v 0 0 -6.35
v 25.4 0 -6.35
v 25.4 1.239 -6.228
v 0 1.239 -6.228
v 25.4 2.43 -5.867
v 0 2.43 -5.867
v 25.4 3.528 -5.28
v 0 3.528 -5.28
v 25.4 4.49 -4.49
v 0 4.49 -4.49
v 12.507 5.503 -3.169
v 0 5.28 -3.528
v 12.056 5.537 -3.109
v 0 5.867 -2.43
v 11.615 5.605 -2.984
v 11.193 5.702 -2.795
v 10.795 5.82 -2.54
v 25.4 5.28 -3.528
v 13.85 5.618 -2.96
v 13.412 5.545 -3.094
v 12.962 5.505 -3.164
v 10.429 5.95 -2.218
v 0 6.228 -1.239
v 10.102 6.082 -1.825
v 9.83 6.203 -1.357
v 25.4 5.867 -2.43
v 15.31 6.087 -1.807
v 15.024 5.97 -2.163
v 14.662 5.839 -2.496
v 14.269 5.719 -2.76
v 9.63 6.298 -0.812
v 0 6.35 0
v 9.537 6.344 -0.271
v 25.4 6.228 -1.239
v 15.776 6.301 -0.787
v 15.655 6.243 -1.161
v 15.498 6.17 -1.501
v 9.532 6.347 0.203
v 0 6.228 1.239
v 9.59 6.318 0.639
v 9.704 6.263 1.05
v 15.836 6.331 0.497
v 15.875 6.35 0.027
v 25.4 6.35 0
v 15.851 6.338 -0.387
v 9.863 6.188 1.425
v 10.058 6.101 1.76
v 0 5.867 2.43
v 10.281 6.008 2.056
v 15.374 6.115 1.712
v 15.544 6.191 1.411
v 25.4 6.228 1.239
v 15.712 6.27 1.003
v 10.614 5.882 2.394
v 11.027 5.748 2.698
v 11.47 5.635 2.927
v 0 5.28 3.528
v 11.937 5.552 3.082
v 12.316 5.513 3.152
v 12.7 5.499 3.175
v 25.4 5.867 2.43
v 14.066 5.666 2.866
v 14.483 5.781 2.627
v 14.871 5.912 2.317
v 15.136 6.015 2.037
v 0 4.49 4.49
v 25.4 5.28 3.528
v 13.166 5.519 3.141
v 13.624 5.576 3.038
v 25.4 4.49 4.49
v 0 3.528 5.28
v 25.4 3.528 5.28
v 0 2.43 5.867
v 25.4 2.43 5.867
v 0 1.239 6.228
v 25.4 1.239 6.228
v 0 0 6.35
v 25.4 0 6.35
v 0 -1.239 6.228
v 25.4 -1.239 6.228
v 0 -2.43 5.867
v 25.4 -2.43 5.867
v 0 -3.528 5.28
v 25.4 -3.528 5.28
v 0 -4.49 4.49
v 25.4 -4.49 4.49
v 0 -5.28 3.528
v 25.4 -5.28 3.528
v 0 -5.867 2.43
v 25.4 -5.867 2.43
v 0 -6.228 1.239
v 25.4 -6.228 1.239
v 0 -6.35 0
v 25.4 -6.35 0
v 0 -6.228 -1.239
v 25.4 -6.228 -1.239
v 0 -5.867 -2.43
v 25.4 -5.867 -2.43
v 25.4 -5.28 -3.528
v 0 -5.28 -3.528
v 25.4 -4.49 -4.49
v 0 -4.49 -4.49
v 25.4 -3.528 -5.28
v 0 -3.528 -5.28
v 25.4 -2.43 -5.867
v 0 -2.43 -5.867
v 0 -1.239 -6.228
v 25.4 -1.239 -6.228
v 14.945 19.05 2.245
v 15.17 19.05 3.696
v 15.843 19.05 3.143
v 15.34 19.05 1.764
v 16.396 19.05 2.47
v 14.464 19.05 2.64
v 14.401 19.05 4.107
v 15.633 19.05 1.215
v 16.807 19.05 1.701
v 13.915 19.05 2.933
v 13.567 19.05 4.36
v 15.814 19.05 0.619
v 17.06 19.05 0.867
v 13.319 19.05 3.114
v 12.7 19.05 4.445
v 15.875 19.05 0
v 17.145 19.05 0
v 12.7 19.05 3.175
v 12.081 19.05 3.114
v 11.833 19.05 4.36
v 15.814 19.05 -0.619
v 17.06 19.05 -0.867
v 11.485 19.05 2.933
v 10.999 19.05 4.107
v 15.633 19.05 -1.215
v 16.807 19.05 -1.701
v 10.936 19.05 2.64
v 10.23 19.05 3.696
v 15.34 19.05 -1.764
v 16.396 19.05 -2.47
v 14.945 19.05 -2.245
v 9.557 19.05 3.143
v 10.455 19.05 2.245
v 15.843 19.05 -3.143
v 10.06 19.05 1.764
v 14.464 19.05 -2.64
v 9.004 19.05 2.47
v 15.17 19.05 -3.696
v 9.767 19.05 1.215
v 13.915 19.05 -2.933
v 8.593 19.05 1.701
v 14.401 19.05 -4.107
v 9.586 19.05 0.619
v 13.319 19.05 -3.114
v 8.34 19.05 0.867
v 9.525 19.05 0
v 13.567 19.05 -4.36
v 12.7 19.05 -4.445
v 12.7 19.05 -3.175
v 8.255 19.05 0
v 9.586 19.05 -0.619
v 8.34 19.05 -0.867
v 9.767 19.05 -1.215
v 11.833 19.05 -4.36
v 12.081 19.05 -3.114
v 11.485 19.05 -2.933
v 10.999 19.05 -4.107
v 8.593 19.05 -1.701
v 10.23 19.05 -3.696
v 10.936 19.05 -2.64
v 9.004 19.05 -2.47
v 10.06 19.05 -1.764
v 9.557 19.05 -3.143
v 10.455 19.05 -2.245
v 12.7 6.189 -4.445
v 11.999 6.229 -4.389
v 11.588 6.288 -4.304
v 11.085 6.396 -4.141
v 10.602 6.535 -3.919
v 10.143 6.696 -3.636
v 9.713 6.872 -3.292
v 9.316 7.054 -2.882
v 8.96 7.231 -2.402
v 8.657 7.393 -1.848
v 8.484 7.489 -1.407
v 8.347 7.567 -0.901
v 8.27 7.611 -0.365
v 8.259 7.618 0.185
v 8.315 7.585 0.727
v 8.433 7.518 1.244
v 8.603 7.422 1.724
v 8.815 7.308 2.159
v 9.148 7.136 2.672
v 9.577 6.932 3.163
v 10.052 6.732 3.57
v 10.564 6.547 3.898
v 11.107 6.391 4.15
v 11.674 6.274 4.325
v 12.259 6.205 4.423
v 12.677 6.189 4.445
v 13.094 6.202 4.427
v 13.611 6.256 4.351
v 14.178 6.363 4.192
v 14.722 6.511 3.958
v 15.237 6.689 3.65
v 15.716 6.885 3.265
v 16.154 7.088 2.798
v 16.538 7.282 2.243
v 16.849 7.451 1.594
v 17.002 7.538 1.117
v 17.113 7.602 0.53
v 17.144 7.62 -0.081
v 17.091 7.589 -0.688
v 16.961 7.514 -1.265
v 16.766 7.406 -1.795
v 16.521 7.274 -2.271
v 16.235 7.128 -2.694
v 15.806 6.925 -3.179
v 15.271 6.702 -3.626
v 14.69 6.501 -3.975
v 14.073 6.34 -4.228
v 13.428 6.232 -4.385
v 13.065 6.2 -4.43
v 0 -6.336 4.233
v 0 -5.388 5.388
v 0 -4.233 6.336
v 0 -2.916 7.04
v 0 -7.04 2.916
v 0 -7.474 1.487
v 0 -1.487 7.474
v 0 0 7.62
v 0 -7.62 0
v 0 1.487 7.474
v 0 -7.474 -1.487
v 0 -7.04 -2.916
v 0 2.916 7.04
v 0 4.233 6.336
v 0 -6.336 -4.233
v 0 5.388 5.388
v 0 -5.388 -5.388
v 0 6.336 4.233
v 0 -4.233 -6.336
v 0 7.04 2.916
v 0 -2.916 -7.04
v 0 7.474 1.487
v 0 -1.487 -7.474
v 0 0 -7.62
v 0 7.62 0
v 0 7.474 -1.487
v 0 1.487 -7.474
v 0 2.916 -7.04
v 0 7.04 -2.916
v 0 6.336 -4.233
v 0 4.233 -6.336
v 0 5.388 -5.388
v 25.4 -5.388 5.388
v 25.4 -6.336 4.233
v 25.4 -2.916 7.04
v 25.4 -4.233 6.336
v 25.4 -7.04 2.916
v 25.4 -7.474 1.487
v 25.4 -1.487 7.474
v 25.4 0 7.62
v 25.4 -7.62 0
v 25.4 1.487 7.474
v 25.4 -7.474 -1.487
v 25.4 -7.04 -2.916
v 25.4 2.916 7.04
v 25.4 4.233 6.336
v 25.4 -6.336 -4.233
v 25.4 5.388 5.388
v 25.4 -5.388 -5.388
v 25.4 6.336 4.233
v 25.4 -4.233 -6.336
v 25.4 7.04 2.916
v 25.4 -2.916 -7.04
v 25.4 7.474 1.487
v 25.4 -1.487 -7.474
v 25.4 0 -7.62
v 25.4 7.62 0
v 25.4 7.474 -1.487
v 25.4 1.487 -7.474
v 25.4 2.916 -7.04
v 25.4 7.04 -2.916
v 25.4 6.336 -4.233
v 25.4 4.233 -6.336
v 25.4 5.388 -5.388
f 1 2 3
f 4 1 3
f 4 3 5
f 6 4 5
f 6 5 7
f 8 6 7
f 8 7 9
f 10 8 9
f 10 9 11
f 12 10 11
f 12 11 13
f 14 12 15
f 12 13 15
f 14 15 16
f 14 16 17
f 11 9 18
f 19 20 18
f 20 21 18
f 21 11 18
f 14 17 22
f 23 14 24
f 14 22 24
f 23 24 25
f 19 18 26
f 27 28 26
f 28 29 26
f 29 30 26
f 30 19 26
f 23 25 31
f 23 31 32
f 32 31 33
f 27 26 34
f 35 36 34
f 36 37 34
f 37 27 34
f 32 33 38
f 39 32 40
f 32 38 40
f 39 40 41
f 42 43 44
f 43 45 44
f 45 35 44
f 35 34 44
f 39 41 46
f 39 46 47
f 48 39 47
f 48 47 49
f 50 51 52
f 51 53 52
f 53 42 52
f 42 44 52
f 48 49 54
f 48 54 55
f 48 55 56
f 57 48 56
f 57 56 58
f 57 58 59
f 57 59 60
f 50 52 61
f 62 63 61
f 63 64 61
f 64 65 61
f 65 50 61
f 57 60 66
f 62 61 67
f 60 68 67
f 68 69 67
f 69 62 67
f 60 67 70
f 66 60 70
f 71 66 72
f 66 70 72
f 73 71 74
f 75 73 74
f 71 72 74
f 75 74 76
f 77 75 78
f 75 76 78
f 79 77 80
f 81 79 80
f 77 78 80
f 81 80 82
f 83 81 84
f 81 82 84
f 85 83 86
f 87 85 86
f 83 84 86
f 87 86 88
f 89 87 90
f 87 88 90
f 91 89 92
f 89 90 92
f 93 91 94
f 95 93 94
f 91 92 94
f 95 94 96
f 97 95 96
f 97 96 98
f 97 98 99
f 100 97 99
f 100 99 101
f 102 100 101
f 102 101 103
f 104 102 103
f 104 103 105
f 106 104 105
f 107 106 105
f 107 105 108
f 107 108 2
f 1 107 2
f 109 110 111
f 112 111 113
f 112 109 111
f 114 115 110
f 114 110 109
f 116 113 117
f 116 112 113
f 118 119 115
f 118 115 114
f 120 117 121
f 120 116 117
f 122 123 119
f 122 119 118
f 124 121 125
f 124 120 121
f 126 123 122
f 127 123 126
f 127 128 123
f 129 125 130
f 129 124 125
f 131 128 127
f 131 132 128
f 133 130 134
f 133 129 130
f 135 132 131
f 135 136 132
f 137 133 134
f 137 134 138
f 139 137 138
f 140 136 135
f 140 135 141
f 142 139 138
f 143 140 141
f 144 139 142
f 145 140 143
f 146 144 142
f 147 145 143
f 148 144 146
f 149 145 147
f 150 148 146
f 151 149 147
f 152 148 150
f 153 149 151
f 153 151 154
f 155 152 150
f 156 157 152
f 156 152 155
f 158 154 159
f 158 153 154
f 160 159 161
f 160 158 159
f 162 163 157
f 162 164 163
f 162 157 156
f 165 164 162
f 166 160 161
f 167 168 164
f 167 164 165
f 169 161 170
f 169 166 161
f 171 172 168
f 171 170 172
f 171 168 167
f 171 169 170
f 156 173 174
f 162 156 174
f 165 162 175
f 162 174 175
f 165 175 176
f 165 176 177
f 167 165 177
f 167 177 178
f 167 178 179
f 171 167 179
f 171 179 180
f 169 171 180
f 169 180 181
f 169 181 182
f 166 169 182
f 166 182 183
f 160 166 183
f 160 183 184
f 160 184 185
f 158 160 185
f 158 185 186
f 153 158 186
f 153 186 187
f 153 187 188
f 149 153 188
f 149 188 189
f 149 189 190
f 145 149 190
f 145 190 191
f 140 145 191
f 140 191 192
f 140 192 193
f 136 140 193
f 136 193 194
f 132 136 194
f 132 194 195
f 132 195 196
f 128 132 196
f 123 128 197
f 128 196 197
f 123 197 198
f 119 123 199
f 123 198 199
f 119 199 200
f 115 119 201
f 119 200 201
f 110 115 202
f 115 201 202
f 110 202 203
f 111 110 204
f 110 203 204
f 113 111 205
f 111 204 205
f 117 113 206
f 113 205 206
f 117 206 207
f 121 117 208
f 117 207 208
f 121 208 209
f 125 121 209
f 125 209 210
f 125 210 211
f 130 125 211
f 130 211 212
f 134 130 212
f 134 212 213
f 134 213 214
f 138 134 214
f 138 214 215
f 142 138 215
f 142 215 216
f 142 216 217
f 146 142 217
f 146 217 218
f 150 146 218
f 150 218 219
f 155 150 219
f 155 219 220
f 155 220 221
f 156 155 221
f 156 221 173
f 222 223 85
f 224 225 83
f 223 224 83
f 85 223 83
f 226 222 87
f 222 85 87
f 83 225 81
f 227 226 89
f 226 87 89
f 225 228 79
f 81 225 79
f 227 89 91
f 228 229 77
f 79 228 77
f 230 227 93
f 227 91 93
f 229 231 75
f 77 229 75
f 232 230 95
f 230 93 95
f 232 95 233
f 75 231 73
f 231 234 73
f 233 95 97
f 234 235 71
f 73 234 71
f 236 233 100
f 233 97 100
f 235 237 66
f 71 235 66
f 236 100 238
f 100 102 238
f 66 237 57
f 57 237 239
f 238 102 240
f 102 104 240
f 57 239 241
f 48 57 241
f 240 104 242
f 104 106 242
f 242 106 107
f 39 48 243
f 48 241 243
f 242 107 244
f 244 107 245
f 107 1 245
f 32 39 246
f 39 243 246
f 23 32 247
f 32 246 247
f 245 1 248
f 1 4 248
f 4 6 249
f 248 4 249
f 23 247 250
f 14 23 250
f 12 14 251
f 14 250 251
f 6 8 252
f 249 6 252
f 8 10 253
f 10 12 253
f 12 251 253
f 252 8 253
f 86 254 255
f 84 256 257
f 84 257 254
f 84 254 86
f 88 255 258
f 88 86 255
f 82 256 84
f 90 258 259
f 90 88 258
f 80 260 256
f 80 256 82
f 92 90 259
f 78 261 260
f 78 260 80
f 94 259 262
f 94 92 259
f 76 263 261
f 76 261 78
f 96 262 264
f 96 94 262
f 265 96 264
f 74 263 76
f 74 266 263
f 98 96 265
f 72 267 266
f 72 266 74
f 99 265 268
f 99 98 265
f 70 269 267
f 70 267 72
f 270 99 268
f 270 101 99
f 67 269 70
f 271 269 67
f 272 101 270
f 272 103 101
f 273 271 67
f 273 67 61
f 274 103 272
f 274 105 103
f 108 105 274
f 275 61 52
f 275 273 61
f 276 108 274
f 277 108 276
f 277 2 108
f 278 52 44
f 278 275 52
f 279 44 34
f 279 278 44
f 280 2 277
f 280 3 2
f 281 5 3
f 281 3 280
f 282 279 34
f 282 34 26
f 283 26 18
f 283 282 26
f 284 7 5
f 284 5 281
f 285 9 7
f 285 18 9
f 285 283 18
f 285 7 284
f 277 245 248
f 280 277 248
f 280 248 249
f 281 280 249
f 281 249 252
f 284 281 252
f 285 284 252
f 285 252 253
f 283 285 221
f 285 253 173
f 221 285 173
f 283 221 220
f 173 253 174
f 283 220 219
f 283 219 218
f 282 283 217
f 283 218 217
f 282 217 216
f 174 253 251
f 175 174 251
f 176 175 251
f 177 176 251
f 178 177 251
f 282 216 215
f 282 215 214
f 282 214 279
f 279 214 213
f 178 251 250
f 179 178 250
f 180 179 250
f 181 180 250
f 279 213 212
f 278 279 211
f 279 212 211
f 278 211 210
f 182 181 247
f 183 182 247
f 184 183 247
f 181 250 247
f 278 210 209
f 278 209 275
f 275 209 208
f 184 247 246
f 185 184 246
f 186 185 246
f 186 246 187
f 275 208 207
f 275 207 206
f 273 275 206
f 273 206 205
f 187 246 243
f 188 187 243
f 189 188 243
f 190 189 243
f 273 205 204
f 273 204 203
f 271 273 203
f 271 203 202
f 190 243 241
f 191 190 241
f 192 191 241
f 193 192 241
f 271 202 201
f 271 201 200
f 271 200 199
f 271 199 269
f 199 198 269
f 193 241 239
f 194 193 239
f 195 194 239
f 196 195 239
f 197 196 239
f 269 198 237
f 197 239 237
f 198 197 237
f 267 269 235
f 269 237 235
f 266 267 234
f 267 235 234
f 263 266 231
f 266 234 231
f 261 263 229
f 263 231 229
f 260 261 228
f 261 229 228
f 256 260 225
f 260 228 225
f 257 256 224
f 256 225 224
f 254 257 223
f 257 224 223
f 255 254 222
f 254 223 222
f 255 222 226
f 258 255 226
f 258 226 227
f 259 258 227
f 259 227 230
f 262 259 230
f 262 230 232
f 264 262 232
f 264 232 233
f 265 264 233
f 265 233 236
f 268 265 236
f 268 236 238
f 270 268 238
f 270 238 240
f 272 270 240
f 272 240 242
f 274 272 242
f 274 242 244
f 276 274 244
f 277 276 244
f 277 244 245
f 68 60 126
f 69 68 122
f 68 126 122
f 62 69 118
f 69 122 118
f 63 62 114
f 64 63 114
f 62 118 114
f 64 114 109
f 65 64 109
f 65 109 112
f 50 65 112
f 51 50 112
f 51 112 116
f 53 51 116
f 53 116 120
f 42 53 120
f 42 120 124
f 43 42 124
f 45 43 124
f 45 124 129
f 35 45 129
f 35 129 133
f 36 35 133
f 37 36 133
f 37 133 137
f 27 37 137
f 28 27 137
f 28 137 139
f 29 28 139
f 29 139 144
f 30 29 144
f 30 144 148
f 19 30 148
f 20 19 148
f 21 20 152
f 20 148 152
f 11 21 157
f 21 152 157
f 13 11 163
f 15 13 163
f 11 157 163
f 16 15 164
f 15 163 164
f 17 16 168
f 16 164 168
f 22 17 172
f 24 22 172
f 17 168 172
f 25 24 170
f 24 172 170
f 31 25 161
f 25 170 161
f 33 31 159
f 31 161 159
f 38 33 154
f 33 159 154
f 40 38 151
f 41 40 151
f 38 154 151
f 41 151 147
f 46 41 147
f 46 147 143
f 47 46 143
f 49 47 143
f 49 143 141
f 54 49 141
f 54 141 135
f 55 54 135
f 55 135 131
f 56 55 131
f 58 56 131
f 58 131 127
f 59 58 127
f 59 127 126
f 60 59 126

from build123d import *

# Parameters (mm, degrees)
SKETCH1_R               = 7.62
BOSS_EXTRUDE1_DEPTH     = 25.4
SKETCH2_R               = 4.445
BOSS_EXTRUDE2_DEPTH     = 19.05
SKETCH3_R               = 6.35
CUT_EXTRUDE1_DEPTH      = 33.651598895
CUT_EXTRUDE2_REACH      = 39.61
CUT_EXTRUDE2_END_RADIUS = 6.35
SKETCH4_R               = 3.175


with BuildPart() as part:
    # Sketch1 → Boss-Extrude1 (new body)
    with BuildSketch(Plane(origin=(0, 0, 0), x_dir=(0, 0, -1), z_dir=(1, 0, 0))):
        Circle(SKETCH1_R)
    extrude(amount=BOSS_EXTRUDE1_DEPTH)

    # Sketch2 → Boss-Extrude2 (add)
    with BuildSketch(Plane(origin=(0, 0, 0), x_dir=(1, 0, 0), z_dir=(0, 1, 0))):
        with Locations(Location((12.7, 0, 0), (0, 0, 90))):
            Circle(SKETCH2_R)
    extrude(amount=BOSS_EXTRUDE2_DEPTH)

    # Sketch3 → Cut-Extrude1 (cut, through all)
    with BuildSketch(Plane(origin=(25.4, 0, 0), x_dir=(0, 0, -1), z_dir=(1, 0, 0))):
        Circle(SKETCH3_R)
    extrude(amount=-CUT_EXTRUDE1_DEPTH, mode=Mode.SUBTRACT)

    # Cut-Extrude2: up to this cylinder (the profile starts outside it)
    cut_extrude2_end = Plane(origin=(12.7, 0, 0), z_dir=(1, 0, 0)) * Cylinder(CUT_EXTRUDE2_END_RADIUS, 92.92, mode=Mode.PRIVATE)
    # Sketch4 → Cut-Extrude2 (cut, up to the surface)
    with BuildSketch(Plane(origin=(0, 19.05, 0), x_dir=(1, 0, 0), z_dir=(0, 1, 0)), mode=Mode.PRIVATE) as cut_extrude2_sk1:
        with Locations(Location((12.7, 0, 0), (0, 0, 270))):
            Circle(SKETCH4_R)
    cut_extrude2_tool1 = extrude(cut_extrude2_sk1.sketch, amount=-CUT_EXTRUDE2_REACH, mode=Mode.PRIVATE) - cut_extrude2_end
    add(cut_extrude2_tool1.solids().sort_by_distance((12.7, 19.05, 0))[0], mode=Mode.SUBTRACT)


solid = part.part
